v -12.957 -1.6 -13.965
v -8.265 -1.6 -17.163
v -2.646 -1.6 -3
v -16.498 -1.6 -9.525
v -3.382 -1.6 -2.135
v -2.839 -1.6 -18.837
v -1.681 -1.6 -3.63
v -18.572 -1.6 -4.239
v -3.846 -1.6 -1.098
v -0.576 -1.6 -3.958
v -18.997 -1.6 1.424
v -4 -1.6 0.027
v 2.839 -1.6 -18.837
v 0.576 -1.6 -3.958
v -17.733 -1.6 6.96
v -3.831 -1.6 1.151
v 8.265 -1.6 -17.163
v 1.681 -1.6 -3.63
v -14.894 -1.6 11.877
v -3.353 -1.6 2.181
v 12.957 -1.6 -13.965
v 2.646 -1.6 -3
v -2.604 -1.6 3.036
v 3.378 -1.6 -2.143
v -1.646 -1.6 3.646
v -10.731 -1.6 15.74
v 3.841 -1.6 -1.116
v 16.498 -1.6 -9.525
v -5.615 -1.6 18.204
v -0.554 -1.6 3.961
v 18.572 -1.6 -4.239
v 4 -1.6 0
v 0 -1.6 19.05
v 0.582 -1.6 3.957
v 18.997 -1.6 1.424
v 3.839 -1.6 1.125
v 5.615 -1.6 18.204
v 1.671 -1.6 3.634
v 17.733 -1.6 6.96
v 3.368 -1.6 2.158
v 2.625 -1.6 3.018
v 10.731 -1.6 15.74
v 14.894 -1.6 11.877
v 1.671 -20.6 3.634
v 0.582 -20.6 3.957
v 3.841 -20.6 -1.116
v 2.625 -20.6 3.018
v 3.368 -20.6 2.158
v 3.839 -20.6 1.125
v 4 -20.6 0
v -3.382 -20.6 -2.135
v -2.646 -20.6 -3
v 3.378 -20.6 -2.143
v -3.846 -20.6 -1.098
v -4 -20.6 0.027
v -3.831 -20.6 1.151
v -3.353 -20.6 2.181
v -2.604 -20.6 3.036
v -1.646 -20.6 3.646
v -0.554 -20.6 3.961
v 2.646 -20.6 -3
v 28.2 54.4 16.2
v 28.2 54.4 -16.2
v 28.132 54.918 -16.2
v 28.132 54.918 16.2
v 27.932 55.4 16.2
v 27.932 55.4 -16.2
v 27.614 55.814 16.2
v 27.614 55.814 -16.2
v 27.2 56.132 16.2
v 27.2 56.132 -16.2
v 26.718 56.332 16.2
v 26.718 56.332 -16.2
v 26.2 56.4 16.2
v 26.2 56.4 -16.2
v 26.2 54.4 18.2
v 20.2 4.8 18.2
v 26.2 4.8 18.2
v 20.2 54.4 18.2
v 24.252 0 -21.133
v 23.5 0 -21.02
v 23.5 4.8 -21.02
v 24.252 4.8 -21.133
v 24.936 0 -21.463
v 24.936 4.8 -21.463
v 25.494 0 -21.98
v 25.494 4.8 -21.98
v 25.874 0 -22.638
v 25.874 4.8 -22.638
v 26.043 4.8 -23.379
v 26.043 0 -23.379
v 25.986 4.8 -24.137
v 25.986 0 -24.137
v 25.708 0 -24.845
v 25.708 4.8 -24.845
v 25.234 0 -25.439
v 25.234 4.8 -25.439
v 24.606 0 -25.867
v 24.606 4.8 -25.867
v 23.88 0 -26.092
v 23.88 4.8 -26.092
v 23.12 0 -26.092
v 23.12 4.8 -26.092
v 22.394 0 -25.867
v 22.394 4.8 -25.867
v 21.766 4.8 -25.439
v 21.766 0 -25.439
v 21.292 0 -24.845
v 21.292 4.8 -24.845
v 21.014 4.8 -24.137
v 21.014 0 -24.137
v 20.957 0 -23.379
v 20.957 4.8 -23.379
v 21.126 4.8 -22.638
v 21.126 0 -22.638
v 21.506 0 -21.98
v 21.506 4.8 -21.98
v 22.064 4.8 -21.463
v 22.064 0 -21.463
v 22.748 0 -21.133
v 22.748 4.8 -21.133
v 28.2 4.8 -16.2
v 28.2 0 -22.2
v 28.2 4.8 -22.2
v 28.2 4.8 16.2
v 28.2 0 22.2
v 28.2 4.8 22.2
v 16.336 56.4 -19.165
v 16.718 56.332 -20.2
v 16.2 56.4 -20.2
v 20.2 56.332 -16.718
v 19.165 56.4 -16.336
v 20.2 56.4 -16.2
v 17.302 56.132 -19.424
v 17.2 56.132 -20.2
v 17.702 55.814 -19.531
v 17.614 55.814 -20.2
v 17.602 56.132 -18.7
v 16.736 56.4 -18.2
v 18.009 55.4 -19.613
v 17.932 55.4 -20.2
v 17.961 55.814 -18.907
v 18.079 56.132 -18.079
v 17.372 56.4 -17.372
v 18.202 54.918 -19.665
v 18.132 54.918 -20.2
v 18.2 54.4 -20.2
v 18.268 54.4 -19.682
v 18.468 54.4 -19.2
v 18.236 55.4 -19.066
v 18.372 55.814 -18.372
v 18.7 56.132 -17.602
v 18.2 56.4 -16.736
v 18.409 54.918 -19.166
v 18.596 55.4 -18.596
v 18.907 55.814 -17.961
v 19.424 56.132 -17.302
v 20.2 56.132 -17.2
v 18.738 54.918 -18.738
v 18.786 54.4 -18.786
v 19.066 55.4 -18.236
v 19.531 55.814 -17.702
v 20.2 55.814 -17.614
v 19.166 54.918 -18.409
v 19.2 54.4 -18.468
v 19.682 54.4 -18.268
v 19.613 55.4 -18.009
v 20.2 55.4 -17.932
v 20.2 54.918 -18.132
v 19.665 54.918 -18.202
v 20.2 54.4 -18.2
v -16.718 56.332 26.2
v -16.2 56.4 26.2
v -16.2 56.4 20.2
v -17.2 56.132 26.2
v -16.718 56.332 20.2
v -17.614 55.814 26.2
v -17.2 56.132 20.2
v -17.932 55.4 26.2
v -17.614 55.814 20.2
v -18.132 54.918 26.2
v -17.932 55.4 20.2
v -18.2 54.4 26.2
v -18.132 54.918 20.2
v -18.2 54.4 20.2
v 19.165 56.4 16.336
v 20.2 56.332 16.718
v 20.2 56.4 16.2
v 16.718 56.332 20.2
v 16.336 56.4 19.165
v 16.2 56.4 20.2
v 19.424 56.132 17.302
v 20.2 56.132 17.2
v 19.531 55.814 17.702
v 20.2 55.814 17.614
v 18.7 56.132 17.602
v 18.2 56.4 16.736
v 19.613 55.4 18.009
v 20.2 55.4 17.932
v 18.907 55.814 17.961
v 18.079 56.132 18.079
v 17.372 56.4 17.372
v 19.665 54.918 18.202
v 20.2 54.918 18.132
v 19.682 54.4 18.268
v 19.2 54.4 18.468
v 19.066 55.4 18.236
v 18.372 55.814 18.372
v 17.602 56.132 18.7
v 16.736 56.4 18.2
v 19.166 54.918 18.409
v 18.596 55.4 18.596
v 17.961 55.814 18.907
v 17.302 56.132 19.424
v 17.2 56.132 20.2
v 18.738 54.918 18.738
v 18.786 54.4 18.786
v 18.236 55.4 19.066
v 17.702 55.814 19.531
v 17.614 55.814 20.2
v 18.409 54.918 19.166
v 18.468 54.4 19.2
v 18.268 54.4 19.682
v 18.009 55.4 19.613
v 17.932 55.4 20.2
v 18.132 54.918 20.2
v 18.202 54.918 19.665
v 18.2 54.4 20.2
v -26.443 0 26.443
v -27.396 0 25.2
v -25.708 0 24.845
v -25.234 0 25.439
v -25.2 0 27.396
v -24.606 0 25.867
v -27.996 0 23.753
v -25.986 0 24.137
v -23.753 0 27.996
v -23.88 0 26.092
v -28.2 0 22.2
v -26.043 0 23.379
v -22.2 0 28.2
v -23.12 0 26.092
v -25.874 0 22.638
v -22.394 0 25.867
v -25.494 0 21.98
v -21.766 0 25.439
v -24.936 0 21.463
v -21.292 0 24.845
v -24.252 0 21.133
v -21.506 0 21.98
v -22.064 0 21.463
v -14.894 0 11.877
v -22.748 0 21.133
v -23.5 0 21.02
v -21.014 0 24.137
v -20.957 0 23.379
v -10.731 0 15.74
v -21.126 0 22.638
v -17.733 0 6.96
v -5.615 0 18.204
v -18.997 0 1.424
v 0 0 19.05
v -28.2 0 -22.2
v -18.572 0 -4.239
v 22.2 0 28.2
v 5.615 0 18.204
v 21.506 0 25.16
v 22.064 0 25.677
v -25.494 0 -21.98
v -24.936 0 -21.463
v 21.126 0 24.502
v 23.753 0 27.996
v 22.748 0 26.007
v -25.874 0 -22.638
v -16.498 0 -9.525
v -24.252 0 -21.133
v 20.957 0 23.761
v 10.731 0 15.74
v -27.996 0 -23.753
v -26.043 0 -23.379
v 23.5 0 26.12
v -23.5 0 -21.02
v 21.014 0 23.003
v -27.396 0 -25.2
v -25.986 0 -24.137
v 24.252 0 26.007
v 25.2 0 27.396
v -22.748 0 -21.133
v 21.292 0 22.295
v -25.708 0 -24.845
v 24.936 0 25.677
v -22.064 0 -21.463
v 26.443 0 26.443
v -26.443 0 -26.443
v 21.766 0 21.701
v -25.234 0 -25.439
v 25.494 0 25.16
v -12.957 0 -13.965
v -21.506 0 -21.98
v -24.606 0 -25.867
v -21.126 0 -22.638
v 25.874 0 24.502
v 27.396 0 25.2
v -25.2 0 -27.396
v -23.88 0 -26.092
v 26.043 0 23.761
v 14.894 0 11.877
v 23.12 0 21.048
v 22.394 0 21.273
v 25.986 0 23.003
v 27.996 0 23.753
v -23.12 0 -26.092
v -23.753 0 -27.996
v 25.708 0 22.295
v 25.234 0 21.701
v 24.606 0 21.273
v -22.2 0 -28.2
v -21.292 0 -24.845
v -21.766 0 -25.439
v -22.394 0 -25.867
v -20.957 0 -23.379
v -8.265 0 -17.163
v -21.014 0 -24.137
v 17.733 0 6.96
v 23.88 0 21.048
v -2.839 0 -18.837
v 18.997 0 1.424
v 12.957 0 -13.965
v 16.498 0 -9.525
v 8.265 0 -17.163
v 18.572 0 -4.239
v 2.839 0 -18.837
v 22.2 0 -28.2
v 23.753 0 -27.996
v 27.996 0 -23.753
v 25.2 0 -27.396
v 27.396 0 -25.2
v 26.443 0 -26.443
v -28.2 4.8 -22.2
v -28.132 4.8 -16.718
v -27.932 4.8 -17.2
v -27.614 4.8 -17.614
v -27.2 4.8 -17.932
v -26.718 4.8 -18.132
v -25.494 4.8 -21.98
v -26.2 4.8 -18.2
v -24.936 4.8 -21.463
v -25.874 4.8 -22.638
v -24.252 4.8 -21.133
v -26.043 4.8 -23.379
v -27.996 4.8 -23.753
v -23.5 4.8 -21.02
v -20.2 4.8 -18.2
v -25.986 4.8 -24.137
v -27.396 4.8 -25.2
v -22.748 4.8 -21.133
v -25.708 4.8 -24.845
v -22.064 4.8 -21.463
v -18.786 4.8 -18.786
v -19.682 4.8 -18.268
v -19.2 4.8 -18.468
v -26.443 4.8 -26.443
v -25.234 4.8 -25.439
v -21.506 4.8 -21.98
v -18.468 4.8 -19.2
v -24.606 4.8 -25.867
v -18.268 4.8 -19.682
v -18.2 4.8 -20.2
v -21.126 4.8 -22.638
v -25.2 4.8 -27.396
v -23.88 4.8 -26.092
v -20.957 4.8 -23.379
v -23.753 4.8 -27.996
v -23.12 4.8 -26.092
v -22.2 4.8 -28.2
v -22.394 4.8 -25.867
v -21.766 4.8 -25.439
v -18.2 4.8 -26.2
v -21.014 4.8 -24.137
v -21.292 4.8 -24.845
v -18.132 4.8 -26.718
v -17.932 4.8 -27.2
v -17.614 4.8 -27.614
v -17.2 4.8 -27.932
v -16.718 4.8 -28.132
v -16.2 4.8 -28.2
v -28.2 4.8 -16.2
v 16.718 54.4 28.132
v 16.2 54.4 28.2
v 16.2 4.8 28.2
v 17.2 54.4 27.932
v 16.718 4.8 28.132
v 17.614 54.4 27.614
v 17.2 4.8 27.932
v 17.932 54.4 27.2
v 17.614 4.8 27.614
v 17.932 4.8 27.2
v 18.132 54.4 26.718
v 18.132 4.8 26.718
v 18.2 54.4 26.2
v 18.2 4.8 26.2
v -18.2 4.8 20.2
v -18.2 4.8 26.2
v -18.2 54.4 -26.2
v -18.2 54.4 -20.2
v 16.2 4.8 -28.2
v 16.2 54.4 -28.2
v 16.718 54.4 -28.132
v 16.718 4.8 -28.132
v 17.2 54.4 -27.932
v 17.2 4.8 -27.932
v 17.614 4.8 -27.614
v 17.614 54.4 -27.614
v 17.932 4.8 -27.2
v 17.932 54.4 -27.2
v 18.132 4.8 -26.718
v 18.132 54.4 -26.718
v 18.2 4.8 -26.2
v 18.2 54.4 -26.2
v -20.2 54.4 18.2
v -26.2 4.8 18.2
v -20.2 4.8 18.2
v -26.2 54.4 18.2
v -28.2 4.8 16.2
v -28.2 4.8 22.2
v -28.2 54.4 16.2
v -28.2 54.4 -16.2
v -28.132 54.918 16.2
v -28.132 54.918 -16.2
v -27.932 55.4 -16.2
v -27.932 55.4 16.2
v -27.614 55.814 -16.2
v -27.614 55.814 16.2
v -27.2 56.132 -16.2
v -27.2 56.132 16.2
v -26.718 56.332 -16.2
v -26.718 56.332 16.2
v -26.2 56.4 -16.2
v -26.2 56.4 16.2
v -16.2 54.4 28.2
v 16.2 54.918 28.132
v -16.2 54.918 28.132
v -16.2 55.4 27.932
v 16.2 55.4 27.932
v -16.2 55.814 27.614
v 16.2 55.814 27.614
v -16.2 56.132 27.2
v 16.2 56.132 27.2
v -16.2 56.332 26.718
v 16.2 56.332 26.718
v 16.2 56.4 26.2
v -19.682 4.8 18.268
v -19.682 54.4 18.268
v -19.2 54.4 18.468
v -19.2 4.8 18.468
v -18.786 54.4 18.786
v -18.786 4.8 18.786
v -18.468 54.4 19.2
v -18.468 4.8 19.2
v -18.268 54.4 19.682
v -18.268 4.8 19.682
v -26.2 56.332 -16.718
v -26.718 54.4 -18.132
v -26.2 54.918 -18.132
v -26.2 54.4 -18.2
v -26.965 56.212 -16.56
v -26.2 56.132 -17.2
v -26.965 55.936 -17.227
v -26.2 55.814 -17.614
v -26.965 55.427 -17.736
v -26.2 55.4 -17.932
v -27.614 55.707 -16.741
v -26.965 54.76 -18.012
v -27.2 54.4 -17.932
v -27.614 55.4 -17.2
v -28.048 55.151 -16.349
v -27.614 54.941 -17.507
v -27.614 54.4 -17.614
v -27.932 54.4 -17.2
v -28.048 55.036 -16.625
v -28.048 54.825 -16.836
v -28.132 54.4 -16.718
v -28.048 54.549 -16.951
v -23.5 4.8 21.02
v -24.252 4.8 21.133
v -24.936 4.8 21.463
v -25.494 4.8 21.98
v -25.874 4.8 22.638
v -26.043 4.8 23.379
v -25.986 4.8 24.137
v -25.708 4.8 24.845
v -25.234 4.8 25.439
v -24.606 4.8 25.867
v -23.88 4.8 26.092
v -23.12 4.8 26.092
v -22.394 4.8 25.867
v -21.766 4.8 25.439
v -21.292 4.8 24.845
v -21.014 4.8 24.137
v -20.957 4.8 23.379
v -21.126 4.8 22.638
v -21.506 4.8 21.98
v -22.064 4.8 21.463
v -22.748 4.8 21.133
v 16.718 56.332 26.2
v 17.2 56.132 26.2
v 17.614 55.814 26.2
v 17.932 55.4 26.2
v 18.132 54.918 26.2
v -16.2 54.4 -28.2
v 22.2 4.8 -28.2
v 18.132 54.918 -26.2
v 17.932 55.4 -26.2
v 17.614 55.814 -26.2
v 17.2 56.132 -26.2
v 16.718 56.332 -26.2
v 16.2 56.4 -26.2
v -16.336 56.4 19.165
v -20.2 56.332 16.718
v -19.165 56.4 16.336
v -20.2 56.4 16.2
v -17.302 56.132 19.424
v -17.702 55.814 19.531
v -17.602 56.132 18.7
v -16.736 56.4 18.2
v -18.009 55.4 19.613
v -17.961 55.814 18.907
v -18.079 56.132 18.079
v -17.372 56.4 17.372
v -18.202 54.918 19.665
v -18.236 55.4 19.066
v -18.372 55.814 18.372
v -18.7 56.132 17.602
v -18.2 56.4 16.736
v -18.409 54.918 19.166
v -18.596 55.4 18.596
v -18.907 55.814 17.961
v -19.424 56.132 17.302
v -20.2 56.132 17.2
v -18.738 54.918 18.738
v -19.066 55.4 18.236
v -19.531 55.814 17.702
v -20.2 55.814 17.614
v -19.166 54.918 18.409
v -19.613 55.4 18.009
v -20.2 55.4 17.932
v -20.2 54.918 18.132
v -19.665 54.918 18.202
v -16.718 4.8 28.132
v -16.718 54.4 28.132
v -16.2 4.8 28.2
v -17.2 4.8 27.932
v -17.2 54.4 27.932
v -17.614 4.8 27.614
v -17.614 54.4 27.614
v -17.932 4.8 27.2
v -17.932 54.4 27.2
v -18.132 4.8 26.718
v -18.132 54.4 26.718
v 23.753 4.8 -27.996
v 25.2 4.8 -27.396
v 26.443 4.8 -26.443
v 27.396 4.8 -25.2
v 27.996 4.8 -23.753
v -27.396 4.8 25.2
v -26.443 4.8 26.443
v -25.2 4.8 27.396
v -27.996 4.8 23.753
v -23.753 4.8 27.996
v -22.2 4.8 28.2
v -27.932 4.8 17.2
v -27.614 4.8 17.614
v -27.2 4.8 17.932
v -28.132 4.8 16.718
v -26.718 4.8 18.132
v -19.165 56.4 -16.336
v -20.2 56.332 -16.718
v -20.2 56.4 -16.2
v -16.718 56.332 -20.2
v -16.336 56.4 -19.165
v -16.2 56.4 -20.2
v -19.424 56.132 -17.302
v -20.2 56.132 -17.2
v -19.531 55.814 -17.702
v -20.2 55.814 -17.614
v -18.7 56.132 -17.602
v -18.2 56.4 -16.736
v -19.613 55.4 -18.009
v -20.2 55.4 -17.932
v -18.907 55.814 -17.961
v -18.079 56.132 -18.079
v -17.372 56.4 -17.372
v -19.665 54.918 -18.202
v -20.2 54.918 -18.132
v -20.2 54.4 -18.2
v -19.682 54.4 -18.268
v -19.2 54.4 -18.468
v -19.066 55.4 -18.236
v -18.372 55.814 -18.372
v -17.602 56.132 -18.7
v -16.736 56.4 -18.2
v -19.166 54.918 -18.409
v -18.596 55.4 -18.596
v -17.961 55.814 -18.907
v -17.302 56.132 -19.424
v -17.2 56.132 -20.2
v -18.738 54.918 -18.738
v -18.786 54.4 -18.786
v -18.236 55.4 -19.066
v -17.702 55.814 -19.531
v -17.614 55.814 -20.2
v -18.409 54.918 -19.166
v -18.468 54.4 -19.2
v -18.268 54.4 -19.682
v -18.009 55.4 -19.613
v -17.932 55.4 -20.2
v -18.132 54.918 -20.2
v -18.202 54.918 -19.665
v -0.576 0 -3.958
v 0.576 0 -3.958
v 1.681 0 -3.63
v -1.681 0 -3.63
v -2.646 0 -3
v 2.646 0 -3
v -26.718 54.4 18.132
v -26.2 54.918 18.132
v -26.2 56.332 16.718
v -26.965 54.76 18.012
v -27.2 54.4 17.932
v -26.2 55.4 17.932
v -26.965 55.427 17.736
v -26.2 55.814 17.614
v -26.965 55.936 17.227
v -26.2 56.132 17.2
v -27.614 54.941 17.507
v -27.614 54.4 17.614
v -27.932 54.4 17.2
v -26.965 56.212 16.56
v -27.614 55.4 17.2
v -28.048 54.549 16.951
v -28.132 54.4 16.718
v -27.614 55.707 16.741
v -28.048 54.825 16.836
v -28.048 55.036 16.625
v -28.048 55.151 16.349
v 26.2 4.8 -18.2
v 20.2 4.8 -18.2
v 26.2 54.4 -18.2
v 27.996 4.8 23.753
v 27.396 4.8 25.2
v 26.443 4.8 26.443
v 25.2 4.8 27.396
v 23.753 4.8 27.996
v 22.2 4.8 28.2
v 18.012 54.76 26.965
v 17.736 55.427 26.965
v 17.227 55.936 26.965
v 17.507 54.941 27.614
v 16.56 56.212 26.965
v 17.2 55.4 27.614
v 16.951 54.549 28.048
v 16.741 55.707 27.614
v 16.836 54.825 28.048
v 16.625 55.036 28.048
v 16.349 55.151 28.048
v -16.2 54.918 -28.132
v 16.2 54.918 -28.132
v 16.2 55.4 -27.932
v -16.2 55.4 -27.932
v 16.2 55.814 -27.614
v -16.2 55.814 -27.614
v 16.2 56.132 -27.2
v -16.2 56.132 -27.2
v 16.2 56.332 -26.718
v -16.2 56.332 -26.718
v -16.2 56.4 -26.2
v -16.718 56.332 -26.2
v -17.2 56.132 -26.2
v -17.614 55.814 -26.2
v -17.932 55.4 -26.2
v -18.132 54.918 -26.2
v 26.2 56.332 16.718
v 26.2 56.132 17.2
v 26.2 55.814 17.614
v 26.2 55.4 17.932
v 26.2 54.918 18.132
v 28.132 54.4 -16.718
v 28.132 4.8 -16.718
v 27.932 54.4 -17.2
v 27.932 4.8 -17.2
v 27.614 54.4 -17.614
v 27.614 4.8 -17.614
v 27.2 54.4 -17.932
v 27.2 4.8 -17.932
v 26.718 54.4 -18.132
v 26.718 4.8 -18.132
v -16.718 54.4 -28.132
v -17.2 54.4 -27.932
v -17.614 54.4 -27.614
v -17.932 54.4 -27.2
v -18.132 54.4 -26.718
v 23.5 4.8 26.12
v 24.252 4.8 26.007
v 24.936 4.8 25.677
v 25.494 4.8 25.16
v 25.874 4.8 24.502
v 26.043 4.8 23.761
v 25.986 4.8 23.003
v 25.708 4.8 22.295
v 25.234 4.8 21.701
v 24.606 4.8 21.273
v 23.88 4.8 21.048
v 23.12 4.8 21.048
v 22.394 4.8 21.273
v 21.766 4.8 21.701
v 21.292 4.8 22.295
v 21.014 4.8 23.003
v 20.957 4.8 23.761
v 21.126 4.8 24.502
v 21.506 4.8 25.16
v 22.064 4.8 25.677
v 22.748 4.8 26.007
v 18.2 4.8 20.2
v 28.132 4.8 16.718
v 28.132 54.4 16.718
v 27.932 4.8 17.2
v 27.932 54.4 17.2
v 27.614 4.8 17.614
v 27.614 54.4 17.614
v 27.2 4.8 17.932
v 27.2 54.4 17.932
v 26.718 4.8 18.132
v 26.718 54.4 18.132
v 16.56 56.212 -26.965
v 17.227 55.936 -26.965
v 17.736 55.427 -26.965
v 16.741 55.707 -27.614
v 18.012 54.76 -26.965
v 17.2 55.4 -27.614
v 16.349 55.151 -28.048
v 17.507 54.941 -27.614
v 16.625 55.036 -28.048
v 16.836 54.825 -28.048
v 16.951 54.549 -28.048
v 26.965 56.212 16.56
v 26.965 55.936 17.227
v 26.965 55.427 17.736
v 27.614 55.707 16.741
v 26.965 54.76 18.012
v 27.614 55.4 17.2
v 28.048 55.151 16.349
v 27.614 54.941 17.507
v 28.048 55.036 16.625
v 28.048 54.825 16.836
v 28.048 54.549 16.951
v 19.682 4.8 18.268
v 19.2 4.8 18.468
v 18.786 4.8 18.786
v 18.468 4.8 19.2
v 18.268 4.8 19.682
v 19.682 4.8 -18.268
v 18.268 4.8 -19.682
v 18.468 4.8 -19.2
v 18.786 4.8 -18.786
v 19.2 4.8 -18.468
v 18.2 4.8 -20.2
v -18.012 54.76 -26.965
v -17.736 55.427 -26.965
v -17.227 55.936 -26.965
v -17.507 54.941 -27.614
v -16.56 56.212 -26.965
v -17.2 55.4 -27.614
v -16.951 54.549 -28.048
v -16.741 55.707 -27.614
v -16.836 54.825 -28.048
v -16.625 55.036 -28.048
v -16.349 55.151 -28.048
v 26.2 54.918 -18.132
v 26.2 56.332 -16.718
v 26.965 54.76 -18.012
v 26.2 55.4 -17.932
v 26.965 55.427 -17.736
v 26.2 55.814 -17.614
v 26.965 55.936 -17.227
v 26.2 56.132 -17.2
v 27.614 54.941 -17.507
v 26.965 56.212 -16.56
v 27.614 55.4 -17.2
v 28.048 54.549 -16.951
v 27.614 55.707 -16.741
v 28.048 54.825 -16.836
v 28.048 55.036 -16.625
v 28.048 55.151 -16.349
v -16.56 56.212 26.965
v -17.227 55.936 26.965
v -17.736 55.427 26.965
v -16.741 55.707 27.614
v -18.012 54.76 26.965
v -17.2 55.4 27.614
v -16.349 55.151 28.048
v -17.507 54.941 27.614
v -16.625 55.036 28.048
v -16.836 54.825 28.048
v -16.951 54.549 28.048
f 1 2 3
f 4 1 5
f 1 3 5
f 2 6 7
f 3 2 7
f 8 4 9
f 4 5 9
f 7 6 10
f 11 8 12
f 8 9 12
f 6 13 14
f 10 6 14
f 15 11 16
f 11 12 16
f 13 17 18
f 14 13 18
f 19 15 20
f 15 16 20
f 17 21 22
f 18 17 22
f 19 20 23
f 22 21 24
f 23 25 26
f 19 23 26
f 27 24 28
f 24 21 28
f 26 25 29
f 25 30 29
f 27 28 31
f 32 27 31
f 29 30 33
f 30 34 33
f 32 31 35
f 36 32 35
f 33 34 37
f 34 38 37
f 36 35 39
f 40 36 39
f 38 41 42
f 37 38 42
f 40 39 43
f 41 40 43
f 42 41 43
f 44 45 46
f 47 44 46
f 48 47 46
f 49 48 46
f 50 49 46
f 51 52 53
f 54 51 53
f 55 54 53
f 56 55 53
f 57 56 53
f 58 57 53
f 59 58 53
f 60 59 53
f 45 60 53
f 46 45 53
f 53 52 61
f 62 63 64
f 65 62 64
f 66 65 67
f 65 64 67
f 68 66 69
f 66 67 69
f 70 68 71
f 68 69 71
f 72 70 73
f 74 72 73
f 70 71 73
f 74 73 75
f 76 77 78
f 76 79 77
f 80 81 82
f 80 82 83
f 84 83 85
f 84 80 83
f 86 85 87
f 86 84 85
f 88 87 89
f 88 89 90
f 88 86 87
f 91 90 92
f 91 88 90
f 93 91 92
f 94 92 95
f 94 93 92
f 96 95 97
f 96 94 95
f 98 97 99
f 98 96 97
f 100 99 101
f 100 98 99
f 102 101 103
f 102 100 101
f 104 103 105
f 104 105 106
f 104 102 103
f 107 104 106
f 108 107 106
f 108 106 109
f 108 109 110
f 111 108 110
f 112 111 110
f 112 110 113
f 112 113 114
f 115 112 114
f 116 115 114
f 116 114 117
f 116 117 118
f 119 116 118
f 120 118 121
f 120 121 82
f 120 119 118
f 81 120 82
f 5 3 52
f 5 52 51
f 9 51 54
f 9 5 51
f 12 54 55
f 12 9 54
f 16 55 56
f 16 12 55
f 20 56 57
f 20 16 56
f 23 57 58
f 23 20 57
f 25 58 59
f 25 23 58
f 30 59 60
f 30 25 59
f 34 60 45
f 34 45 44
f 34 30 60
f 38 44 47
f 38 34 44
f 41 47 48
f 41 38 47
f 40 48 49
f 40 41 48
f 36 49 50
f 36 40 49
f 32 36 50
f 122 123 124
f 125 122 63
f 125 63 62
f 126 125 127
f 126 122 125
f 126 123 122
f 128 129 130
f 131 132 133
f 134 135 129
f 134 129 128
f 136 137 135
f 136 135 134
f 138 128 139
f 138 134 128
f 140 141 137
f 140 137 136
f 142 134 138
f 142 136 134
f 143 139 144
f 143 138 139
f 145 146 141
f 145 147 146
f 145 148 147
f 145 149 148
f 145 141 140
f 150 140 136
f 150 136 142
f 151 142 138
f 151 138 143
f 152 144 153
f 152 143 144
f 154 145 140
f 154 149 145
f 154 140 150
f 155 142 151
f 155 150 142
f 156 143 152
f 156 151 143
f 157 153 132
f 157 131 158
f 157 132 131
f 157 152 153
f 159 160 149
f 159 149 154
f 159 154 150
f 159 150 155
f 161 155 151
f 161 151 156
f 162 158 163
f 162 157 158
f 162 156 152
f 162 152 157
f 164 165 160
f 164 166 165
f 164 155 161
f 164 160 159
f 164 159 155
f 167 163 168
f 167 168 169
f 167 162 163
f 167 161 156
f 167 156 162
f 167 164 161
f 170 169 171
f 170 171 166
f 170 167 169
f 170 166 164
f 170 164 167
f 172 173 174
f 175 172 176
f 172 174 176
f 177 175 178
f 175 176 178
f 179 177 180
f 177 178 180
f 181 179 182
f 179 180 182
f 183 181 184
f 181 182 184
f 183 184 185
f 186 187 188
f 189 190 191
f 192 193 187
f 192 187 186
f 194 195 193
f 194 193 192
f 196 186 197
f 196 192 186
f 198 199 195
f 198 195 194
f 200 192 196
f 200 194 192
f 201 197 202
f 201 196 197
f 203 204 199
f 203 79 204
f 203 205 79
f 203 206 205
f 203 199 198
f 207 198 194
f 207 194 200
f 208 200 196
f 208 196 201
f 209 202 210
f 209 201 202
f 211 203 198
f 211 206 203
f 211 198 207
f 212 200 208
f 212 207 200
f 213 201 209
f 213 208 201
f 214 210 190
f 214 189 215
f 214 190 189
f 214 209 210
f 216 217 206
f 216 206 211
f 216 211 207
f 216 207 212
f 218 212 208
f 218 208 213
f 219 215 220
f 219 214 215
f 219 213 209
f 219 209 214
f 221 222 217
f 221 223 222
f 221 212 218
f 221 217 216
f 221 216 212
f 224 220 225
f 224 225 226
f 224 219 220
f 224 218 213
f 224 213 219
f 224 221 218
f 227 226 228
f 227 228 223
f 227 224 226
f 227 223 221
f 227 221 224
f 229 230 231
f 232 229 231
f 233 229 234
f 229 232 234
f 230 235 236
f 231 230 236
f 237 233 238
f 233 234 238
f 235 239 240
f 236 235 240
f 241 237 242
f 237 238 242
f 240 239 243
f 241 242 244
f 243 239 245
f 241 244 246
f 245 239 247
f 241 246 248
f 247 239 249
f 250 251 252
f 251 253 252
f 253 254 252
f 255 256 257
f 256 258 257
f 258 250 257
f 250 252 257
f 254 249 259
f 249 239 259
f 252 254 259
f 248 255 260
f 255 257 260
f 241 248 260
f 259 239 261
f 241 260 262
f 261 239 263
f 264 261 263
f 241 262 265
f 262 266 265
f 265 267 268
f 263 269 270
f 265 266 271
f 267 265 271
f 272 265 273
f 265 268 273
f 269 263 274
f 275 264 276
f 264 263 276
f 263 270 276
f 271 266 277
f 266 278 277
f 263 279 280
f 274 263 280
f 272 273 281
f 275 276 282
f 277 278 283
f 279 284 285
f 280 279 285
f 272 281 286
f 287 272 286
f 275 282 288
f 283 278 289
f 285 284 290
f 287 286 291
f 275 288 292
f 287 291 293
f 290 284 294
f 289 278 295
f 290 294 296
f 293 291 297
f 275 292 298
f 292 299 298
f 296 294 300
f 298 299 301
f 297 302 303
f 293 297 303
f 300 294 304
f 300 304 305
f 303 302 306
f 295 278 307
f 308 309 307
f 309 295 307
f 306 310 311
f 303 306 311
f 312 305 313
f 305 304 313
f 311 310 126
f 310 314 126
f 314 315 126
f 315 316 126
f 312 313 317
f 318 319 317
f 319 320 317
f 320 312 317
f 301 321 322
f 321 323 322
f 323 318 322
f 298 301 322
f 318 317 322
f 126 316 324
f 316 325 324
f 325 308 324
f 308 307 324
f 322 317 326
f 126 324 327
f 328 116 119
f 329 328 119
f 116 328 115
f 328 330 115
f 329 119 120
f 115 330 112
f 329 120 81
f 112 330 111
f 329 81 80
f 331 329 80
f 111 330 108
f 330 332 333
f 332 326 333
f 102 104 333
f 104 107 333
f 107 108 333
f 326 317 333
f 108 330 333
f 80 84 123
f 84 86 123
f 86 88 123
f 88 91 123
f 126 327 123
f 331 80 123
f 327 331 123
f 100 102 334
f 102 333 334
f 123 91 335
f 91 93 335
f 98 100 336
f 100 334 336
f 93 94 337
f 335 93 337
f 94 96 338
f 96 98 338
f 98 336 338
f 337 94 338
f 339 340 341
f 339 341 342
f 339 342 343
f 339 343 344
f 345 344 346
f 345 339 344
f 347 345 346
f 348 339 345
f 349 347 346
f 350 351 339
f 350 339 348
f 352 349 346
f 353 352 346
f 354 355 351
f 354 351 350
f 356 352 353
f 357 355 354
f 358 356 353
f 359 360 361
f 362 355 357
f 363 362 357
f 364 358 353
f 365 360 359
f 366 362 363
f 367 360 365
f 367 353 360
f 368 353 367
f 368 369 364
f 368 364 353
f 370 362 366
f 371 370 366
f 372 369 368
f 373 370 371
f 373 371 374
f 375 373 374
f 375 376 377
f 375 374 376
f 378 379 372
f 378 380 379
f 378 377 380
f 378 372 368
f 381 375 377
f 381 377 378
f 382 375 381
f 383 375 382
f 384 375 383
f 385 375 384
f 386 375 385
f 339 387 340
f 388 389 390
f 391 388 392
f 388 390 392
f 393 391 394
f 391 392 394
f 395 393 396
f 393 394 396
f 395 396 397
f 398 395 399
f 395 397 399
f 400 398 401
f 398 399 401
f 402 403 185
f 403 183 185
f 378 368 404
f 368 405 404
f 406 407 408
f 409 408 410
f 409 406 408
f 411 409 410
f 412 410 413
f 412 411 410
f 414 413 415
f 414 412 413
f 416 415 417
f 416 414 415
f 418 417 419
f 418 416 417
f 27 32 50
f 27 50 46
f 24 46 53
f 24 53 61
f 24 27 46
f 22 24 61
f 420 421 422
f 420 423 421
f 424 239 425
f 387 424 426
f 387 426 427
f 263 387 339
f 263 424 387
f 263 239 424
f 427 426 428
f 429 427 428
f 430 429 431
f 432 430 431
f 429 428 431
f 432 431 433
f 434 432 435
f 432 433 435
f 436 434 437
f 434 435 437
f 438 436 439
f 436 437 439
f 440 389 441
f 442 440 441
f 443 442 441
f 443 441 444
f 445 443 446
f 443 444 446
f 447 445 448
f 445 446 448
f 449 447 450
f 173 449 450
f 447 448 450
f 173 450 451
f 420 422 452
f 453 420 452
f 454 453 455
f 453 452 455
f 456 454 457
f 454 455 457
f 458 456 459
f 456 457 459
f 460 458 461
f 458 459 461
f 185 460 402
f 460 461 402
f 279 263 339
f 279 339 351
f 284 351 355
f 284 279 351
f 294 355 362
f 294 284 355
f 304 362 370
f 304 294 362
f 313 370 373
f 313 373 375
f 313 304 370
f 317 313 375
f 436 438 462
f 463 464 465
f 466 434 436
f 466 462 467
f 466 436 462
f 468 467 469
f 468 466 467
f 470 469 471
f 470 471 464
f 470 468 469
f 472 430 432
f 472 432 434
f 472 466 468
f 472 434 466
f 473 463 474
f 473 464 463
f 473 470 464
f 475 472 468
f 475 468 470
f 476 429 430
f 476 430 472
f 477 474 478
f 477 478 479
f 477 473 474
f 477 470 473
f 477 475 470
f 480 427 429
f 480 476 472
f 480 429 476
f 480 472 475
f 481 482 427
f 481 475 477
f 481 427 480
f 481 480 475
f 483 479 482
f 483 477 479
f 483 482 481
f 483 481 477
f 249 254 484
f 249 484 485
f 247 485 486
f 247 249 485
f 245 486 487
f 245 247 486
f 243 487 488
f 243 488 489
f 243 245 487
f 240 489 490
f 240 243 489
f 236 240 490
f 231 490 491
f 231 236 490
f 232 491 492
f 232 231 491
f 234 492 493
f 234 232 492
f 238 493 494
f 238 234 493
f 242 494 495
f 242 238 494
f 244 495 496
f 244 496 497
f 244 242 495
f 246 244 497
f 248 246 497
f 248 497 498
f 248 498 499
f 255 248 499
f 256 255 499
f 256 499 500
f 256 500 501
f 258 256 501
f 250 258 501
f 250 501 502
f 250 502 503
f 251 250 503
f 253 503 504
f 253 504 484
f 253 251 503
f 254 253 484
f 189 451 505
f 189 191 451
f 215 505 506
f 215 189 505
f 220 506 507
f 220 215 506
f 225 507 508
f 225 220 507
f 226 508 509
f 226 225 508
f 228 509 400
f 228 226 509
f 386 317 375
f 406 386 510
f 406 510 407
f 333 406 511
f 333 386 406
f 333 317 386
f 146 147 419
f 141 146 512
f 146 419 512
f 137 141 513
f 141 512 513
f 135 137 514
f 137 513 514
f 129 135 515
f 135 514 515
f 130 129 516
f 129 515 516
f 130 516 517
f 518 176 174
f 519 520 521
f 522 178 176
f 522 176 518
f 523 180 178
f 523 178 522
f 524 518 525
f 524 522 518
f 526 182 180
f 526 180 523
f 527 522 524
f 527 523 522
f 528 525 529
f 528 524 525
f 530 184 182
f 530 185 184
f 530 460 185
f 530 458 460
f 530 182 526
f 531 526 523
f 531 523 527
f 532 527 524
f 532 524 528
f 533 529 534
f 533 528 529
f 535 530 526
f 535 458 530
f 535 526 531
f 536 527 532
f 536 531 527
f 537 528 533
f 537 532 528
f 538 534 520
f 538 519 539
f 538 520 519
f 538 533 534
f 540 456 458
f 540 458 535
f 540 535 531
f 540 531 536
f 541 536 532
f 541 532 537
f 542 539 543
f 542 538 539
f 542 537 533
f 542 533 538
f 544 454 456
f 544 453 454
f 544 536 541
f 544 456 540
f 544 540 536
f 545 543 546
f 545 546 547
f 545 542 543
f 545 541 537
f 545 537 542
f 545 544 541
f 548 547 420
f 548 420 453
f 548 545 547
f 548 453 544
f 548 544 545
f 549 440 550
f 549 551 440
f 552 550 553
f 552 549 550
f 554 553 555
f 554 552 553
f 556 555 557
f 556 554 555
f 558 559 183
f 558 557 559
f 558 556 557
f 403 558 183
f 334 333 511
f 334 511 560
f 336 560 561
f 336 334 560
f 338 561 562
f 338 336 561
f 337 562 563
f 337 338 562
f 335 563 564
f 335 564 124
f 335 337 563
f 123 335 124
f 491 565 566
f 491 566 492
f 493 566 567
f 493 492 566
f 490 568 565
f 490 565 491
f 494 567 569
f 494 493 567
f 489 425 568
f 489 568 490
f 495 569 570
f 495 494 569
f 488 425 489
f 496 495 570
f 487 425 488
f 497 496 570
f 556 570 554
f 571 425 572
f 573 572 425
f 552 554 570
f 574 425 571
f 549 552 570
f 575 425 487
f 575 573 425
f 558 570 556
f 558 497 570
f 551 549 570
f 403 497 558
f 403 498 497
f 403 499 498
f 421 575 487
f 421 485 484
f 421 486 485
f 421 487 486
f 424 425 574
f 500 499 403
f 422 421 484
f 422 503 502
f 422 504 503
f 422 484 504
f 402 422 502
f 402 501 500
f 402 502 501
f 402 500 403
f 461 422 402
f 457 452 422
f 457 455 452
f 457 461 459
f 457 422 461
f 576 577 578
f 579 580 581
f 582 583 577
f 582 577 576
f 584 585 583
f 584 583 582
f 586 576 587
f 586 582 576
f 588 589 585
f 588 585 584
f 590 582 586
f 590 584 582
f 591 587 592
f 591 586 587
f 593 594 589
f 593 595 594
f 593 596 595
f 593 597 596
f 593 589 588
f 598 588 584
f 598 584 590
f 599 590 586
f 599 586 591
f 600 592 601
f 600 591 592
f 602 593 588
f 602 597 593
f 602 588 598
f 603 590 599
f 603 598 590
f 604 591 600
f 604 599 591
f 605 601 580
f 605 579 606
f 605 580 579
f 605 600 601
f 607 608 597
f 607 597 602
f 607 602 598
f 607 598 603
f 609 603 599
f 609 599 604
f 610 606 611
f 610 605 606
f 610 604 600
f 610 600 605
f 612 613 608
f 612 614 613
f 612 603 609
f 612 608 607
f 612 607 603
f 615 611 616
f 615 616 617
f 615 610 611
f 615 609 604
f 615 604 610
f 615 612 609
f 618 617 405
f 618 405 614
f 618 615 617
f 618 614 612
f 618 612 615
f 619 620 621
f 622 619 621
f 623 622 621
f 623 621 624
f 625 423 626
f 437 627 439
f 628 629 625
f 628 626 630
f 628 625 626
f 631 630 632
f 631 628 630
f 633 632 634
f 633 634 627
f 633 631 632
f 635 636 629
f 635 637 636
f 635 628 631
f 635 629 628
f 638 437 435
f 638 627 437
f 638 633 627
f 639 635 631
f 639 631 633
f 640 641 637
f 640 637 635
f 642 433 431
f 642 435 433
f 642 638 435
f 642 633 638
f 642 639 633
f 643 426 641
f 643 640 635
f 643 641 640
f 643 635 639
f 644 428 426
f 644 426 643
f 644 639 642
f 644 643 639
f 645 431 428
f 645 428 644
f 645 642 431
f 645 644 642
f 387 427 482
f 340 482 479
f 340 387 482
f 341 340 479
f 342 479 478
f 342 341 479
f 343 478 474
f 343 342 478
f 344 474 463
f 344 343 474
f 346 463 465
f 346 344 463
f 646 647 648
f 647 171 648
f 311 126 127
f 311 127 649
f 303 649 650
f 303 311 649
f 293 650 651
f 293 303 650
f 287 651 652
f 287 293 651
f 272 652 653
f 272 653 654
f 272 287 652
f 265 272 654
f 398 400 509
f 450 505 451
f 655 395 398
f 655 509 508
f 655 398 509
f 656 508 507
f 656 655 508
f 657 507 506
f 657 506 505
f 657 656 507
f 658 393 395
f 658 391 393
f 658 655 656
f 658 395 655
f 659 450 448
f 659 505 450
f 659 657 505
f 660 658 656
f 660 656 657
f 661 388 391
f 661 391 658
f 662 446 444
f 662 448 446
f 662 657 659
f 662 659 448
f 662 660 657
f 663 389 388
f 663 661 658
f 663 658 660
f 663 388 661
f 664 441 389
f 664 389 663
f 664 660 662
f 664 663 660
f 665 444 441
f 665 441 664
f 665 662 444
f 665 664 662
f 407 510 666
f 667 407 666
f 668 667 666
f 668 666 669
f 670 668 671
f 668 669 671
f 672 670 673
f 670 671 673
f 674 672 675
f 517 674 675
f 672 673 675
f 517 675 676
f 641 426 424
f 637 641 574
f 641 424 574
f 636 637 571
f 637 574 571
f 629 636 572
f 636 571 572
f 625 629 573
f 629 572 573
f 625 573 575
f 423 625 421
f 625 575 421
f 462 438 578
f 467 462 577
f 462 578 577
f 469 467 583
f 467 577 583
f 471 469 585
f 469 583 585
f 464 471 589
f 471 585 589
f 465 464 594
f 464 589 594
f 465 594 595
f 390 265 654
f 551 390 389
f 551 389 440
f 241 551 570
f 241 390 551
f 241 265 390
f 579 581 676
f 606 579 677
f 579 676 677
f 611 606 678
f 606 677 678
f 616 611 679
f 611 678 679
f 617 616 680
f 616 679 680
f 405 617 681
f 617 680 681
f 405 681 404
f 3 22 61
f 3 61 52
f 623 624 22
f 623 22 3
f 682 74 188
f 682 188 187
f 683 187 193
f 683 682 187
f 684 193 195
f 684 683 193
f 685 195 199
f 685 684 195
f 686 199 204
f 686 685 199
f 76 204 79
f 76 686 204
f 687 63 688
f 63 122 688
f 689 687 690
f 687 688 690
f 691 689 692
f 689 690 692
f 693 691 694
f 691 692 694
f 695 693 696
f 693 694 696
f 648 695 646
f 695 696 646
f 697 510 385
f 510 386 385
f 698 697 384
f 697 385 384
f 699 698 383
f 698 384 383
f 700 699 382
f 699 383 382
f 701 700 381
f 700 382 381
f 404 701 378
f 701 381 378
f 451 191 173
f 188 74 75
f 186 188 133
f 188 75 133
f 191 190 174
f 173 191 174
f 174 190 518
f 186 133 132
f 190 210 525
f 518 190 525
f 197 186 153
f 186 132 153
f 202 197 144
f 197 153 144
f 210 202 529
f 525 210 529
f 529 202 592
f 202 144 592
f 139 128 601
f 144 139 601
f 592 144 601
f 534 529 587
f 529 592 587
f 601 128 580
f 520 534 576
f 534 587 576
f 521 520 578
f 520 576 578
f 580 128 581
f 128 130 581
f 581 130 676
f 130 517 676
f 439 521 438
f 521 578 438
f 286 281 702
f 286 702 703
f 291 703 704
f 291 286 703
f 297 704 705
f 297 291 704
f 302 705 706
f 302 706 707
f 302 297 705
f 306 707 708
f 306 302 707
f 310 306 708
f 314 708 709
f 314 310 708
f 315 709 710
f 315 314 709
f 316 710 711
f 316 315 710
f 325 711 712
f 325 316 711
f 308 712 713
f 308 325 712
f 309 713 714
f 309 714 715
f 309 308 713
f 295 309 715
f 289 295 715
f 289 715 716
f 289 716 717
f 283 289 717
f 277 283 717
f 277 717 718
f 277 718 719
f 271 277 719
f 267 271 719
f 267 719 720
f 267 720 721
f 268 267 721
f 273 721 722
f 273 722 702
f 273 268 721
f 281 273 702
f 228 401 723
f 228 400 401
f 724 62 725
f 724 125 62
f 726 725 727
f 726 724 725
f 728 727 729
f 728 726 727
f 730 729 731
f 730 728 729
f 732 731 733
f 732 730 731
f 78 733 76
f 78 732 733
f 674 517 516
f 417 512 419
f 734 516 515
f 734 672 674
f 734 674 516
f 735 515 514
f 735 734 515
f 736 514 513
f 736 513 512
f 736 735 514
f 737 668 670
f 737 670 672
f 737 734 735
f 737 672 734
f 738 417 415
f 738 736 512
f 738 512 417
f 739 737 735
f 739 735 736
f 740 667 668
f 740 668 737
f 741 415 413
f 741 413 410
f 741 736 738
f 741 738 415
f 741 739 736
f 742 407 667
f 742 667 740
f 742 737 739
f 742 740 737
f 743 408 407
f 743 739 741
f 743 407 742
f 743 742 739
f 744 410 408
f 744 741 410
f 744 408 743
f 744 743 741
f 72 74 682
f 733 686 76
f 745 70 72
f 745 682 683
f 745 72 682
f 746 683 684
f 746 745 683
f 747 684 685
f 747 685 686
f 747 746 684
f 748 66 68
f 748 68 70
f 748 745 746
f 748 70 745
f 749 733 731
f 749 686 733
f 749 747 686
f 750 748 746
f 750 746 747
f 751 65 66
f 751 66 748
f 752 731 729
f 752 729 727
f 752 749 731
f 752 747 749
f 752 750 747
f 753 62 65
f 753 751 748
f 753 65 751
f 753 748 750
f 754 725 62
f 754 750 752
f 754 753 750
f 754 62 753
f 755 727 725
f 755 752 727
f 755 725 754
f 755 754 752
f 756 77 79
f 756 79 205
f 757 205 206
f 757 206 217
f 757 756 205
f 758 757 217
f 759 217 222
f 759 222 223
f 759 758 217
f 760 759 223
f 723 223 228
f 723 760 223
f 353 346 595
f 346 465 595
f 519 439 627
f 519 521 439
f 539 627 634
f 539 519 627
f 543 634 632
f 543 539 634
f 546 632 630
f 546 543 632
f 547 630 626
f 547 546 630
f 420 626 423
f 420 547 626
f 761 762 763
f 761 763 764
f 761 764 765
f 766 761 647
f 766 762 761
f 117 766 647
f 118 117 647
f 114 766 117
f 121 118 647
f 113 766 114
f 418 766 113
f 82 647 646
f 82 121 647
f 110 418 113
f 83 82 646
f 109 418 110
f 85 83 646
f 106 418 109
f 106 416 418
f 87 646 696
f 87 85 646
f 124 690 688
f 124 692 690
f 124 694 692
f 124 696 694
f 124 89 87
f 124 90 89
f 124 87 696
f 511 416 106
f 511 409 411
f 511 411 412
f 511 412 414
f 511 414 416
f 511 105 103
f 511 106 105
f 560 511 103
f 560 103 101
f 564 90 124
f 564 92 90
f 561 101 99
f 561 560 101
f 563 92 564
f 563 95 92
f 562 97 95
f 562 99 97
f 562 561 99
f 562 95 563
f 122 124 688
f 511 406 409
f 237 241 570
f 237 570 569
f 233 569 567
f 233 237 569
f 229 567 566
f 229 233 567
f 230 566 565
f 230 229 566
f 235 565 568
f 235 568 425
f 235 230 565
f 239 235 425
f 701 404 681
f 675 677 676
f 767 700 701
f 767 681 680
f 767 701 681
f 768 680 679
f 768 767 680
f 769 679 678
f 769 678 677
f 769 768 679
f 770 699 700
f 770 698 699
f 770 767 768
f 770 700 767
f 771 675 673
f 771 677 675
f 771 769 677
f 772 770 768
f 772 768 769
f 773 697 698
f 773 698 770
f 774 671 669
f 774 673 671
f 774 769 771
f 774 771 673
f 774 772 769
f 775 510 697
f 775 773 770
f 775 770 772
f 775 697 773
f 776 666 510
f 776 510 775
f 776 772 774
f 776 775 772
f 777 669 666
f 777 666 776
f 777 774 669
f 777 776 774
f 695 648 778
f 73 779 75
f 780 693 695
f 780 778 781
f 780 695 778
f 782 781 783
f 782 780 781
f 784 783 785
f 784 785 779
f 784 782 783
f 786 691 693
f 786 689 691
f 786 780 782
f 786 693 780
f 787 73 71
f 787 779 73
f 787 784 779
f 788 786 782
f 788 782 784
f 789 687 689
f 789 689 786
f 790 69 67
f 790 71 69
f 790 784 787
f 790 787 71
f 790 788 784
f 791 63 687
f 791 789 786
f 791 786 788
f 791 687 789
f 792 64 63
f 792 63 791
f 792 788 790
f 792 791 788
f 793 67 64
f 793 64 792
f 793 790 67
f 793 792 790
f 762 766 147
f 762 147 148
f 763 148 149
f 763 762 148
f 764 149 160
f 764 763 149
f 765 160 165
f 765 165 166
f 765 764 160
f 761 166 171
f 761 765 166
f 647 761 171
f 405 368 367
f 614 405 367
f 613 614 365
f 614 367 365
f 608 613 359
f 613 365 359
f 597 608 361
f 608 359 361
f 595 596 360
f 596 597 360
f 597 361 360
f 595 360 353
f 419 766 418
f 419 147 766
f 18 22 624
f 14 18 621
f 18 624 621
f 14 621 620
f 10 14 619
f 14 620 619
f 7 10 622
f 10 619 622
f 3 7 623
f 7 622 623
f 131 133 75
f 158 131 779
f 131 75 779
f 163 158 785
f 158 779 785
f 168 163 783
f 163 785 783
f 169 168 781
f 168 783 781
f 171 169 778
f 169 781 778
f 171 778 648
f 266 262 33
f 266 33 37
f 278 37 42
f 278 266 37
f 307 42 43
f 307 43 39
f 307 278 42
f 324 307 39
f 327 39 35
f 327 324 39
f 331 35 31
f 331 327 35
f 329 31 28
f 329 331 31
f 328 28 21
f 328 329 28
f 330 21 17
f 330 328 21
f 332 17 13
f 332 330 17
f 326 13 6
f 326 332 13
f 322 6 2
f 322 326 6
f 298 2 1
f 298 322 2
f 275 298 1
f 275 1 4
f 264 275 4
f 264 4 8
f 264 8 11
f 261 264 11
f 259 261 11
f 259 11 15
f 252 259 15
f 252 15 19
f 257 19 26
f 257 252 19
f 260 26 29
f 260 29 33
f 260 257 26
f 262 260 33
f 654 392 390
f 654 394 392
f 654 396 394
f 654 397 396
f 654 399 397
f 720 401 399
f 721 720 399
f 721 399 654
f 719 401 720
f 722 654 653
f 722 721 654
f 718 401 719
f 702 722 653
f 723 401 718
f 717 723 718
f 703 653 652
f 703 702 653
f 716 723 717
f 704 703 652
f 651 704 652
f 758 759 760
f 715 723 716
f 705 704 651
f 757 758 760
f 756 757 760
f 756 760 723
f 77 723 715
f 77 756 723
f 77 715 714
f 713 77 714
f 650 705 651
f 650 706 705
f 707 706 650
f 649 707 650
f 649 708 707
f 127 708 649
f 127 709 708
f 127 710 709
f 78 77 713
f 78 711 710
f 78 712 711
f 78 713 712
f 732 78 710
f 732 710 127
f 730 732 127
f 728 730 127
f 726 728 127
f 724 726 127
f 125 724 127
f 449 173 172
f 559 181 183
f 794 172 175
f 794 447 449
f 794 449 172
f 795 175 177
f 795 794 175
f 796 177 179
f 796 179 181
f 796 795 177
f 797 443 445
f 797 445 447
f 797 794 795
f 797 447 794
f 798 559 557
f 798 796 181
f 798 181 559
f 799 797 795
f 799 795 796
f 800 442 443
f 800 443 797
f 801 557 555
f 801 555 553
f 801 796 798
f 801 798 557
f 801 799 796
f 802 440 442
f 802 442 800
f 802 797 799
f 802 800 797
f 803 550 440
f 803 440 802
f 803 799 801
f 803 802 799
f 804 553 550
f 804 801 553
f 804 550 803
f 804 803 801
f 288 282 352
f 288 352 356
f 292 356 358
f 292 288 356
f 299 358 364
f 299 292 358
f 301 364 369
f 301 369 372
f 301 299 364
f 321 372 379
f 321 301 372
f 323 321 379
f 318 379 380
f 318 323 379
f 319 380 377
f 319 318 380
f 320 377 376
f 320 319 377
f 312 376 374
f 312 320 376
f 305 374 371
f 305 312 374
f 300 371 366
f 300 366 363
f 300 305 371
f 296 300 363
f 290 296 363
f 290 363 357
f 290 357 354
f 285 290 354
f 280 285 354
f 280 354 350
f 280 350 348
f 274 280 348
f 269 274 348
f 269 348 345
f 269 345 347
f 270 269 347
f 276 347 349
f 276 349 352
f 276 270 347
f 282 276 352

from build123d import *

# Parameters (mm, degrees)
SKETCH_1_R          = 2.55
SKETCH_1_R_2        = 19.05
EXTRUDE_1_DEPTH     = 56.4
SKETCH_1_3_R        = 19.05
SKETCH_1_3_R_2      = 4
EXTRUDE_2_DEPTH     = 1.6
SKETCH_1_4_R        = 2.55
CUT_EXTRUDE_1_DEPTH = 4.8
EXTRUDE_3_DEPTH     = 20.6
SKETCH_4_W          = 10
SKETCH_4_H          = 10
CUT_EXTRUDE_3_DEPTH = 51.6
FILLET_3_R          = 2
FILLET_4_R          = 2


with BuildPart() as part:
    # 草图1 → 凸台-拉伸1 (new body)
    # profile 1 of 10: a face of its own
    with BuildSketch(Plane(origin=(0, 0, 0), x_dir=(1, 0, 0), z_dir=(0, 1, 0))):
        with BuildLine():
            Line((-22.2, 28.2), (22.2, 28.2))
            ThreePointArc((22.2, 28.2), (26.442640687, 26.442640687), (28.2, 22.2))
            Line((28.2, 22.2), (28.2, -22.2))
            ThreePointArc((28.2, -22.2), (26.442640687, -26.442640687), (22.2, -28.2))
            Line((22.2, -28.2), (-22.2, -28.2))
            ThreePointArc((-22.2, -28.2), (-26.442640687, -26.442640687), (-28.2, -22.2))
            Line((-28.2, -22.2), (-28.2, 22.2))
            ThreePointArc((-28.2, 22.2), (-26.442640687, 26.442640687), (-22.2, 28.2))
        make_face()
        with Locations((23.5, 23.57)):
            Circle(SKETCH_1_R, mode=Mode.SUBTRACT)
        with Locations((23.5, -23.57)):
            Circle(SKETCH_1_R, mode=Mode.SUBTRACT)
        Circle(SKETCH_1_R_2, mode=Mode.SUBTRACT)
        with Locations((-23.5, 23.57)):
            Circle(SKETCH_1_R, mode=Mode.SUBTRACT)
        with Locations((-23.5, -23.57)):
            Circle(SKETCH_1_R, mode=Mode.SUBTRACT)
    # profile 2 of 10: a face of its own
    with BuildSketch(Plane(origin=(0, 0, 0), x_dir=(1, 0, 0), z_dir=(0, 1, 0))):
        Circle(SKETCH_1_R_2)
    # profile 3 of 10: a face of its own
    with BuildSketch(Plane(origin=(0, 0, 0), x_dir=(1, 0, 0), z_dir=(0, 1, 0))):
        with Locations((-23.5, 23.57)):
            Circle(SKETCH_1_R)
    # profile 4 of 10: a face of its own
    with BuildSketch(Plane(origin=(0, 0, 0), x_dir=(1, 0, 0), z_dir=(0, 1, 0))):
        with Locations((23.5, 23.57)):
            Circle(SKETCH_1_R)
    # profile 5 of 10: a face of its own
    with BuildSketch(Plane(origin=(0, 0, 0), x_dir=(1, 0, 0), z_dir=(0, 1, 0))):
        with Locations((23.5, -23.57)):
            Circle(SKETCH_1_R)
    # profile 6 of 10: a face of its own
    with BuildSketch(Plane(origin=(0, 0, 0), x_dir=(1, 0, 0), z_dir=(0, 1, 0))):
        with Locations((-23.5, -23.57)):
            Circle(SKETCH_1_R)
    # profile 7 of 10: a face of its own
    with BuildSketch(Plane(origin=(0, 0, 0), x_dir=(1, 0, 0), z_dir=(0, 1, 0))):
        with BuildLine():
            ThreePointArc((2.645751311, 3), (0, 4), (-2.645751311, 3))
            Line((-2.645751311, 3), (2.645751311, 3))
        make_face()
    # profile 8 of 10: a face of its own
    with BuildSketch(Plane(origin=(0, 0, 0), x_dir=(1, 0, 0), z_dir=(0, 1, 0))):
        with BuildLine():
            Line((2.645751311, 3), (-2.645751311, 3))
            ThreePointArc((-2.645751311, 3), (-1.645751311, -3.645751311), (4, 0))
            ThreePointArc((4, 0), (3.645751311, 1.645751311), (2.645751311, 3))
        make_face()
    # profile 9 of 10: a face of its own
    with BuildSketch(Plane(origin=(0, 0, 0), x_dir=(1, 0, 0), z_dir=(0, 1, 0))):
        with BuildLine():
            ThreePointArc((2.645751311, 3), (0, 4), (-2.645751311, 3))
            Line((-2.645751311, 3), (2.645751311, 3))
        make_face()
    # profile 10 of 10: a face of its own
    with BuildSketch(Plane(origin=(0, 0, 0), x_dir=(1, 0, 0), z_dir=(0, 1, 0))):
        with BuildLine():
            Line((2.645751311, 3), (-2.645751311, 3))
            ThreePointArc((-2.645751311, 3), (-1.645751311, -3.645751311), (4, 0))
            ThreePointArc((4, 0), (3.645751311, 1.645751311), (2.645751311, 3))
        make_face()
    extrude(amount=EXTRUDE_1_DEPTH)

    # 草图1<3> → 凸台-拉伸2 (add)
    with BuildSketch(Plane(origin=(0, 0, 0), x_dir=(1, 0, 0), z_dir=(0, 1, 0))):
        with Locations(Location((0, 0, 0), (0, 0, 270))):
            Circle(SKETCH_1_3_R)
        with Locations(Location((0, 0, 0), (0, 0, 270))):
            Circle(SKETCH_1_3_R_2, mode=Mode.SUBTRACT)
    extrude(amount=-EXTRUDE_2_DEPTH)

    # 草图1<4> → 切除-拉伸1 (cut)
    with BuildSketch(Plane(origin=(0, 0, 0), x_dir=(1, 0, 0), z_dir=(0, 1, 0))):
        with Locations(Location((23.5, -23.57, 0), (0, 0, 270))):
            Circle(SKETCH_1_4_R)
        with Locations(Location((-23.5, 23.57, 0), (0, 0, 270))):
            Circle(SKETCH_1_4_R)
        with Locations(Location((23.5, 23.57, 0), (0, 0, 270))):
            Circle(SKETCH_1_4_R)
        with Locations(Location((-23.5, -23.57, 0), (0, 0, 90))):
            Circle(SKETCH_1_4_R)
    extrude(amount=CUT_EXTRUDE_1_DEPTH, mode=Mode.SUBTRACT)

    # 草图1<5> → 凸台-拉伸3 (add)
    with BuildSketch(Plane(origin=(0, 0, 0), x_dir=(1, 0, 0), z_dir=(0, 1, 0))):
        with BuildLine():
            Line((2.645751311, 3), (-2.645751311, 3))
            ThreePointArc((-2.645751311, 3), (-1.645751311, -3.645751311), (4, 0))
            ThreePointArc((4, 0), (3.645751311, 1.645751311), (2.645751311, 3))
        make_face()
    extrude(amount=-EXTRUDE_3_DEPTH)

    # 草图4 → 切除-拉伸3 (cut)
    with BuildSketch(Plane(origin=(0, 56.4, 0), x_dir=(1, 0, 0), z_dir=(0, 1, 0))):
        with Locations((-23.2, 23.2)):
            Rectangle(SKETCH_4_W, SKETCH_4_H)
        with Locations((-23.2, -23.2)):
            Rectangle(SKETCH_4_W, SKETCH_4_H)
        with Locations((23.2, -23.2)):
            Rectangle(SKETCH_4_W, SKETCH_4_H)
        with Locations((23.2, 23.2)):
            Rectangle(SKETCH_4_W, SKETCH_4_H)
    extrude(amount=-CUT_EXTRUDE_3_DEPTH, mode=Mode.SUBTRACT)

    # 圆角3
    fillet_3_edges = [part.edges().sort_by_distance(p)[0] for p in [
        (-23.2, 56.4, -18.2),
        (-18.2, 56.4, -23.2),
        (-28.2, 30.6, -18.2),
        (-18.2, 30.6, -28.2),
        (-18.2, 30.6, -18.2),
        (28.2, 30.6, -18.2),
        (18.2, 30.6, -18.2),
        (18.2, 30.6, -28.2),
        (18.2, 56.4, -23.2),
        (23.2, 56.4, -18.2),
        (23.2, 56.4, 18.2),
        (18.2, 56.4, 23.2),
        (28.2, 30.6, 18.2),
        (18.2, 30.6, 28.2),
        (18.2, 30.6, 18.2),
        (-18.2, 56.4, 23.2),
        (-23.2, 56.4, 18.2),
        (-18.2, 30.6, 28.2),
        (-28.2, 30.6, 18.2),
        (-18.2, 30.6, 18.2),
    ]]
    fillet(fillet_3_edges, radius=FILLET_3_R)

    # 圆角4
    # the kernel refuses this fillet: 2 mm, written as the material it takes off along each edge
    with BuildSketch(Plane(origin=(26.2, 54.4, 16.2), x_dir=(0, 1, 0), z_dir=(1, 0, 0))) as fillet_4_piece_1_section:
        Polygon((0, 0), (FILLET_4_R, 0), (FILLET_4_R, FILLET_4_R), (0, FILLET_4_R), align=None)
    fillet_4_piece_1 = extrude(amount=FILLET_4_R, mode=Mode.PRIVATE)
    fillet_4_piece_1 = fillet_4_piece_1 - Plane(origin=(26.2, 54.4, 16.2), x_dir=(0, -0.7071067811865475, -0.7071067811865475), z_dir=(1, 0, 0)) * Sphere(FILLET_4_R, mode=Mode.PRIVATE)
    add(fillet_4_piece_1, mode=Mode.SUBTRACT)
    with BuildSketch(Plane(origin=(16.2, 54.4, 26.2), x_dir=(0, 1, 0), z_dir=(0, 0, 1))) as fillet_4_piece_2_section:
        Polygon((0, 0), (FILLET_4_R, 0), (FILLET_4_R, -FILLET_4_R), (0, -FILLET_4_R), align=None)
    fillet_4_piece_2 = extrude(amount=FILLET_4_R, mode=Mode.PRIVATE)
    fillet_4_piece_2 = fillet_4_piece_2 - Plane(origin=(16.2, 54.4, 26.2), x_dir=(-0.7071067811865475, -0.7071067811865475, 1.0048591735576168e-15), z_dir=(0, 0, 1)) * Sphere(FILLET_4_R, mode=Mode.PRIVATE)
    add(fillet_4_piece_2, mode=Mode.SUBTRACT)
    with BuildSketch(Plane(origin=(-26.2, 54.4, 16.2), x_dir=(0, 1, 0), z_dir=(-1, 0, 0))) as fillet_4_piece_3_section:
        Polygon((0, 0), (FILLET_4_R, 0), (FILLET_4_R, -FILLET_4_R), (0, -FILLET_4_R), align=None)
    fillet_4_piece_3 = extrude(amount=FILLET_4_R, mode=Mode.PRIVATE)
    fillet_4_piece_3 = fillet_4_piece_3 - Plane(origin=(-26.2, 54.4, 16.2), x_dir=(0, -0.7071067811865475, -0.7071067811865475), z_dir=(-1, 0, 0)) * Sphere(FILLET_4_R, mode=Mode.PRIVATE)
    add(fillet_4_piece_3, mode=Mode.SUBTRACT)
    with BuildSketch(Plane(origin=(-16.2, 54.4, 26.2), x_dir=(0, 1, 0), z_dir=(0, 0, 1))) as fillet_4_piece_4_section:
        Polygon((0, 0), (FILLET_4_R, 0), (FILLET_4_R, FILLET_4_R), (0, FILLET_4_R), align=None)
    fillet_4_piece_4 = extrude(amount=FILLET_4_R, mode=Mode.PRIVATE)
    fillet_4_piece_4 = fillet_4_piece_4 - Plane(origin=(-16.2, 54.4, 26.2), x_dir=(0.7071067811865475, -0.7071067811865475, 0), z_dir=(0, 0, 1)) * Sphere(FILLET_4_R, mode=Mode.PRIVATE)
    add(fillet_4_piece_4, mode=Mode.SUBTRACT)
    with BuildSketch(Plane(origin=(-16.2, 54.4, -26.2), x_dir=(0, 1, 0), z_dir=(0, 0, -1))) as fillet_4_piece_5_section:
        Polygon((0, 0), (FILLET_4_R, 0), (FILLET_4_R, -FILLET_4_R), (0, -FILLET_4_R), align=None)
    fillet_4_piece_5 = extrude(amount=FILLET_4_R, mode=Mode.PRIVATE)
    fillet_4_piece_5 = fillet_4_piece_5 - Plane(origin=(-16.2, 54.4, -26.2), x_dir=(0.7071067811865475, -0.7071067811865475, 0), z_dir=(0, 0, -1)) * Sphere(FILLET_4_R, mode=Mode.PRIVATE)
    add(fillet_4_piece_5, mode=Mode.SUBTRACT)
    with BuildSketch(Plane(origin=(-26.2, 54.4, -16.2), x_dir=(0, 1, 0), z_dir=(-1, 0, 0))) as fillet_4_piece_6_section:
        Polygon((0, 0), (FILLET_4_R, 0), (FILLET_4_R, FILLET_4_R), (0, FILLET_4_R), align=None)
    fillet_4_piece_6 = extrude(amount=FILLET_4_R, mode=Mode.PRIVATE)
    fillet_4_piece_6 = fillet_4_piece_6 - Plane(origin=(-26.2, 54.4, -16.2), x_dir=(0, -0.7071067811865475, 0.7071067811865475), z_dir=(-1, 0, 0)) * Sphere(FILLET_4_R, mode=Mode.PRIVATE)
    add(fillet_4_piece_6, mode=Mode.SUBTRACT)
    with BuildSketch(Plane(origin=(26.2, 54.4, -16.2), x_dir=(0, 1, 0), z_dir=(1, 0, 0))) as fillet_4_piece_7_section:
        Polygon((0, 0), (FILLET_4_R, 0), (FILLET_4_R, -FILLET_4_R), (0, -FILLET_4_R), align=None)
    fillet_4_piece_7 = extrude(amount=FILLET_4_R, mode=Mode.PRIVATE)
    fillet_4_piece_7 = fillet_4_piece_7 - Plane(origin=(26.2, 54.4, -16.2), x_dir=(0, -0.7071067811865475, 0.7071067811865475), z_dir=(1, 0, 0)) * Sphere(FILLET_4_R, mode=Mode.PRIVATE)
    add(fillet_4_piece_7, mode=Mode.SUBTRACT)
    with BuildSketch(Plane(origin=(16.2, 54.4, -26.2), x_dir=(0, 1, 0), z_dir=(0, 0, -1))) as fillet_4_piece_8_section:
        Polygon((0, 0), (FILLET_4_R, 0), (FILLET_4_R, FILLET_4_R), (0, FILLET_4_R), align=None)
    fillet_4_piece_8 = extrude(amount=FILLET_4_R, mode=Mode.PRIVATE)
    fillet_4_piece_8 = fillet_4_piece_8 - Plane(origin=(16.2, 54.4, -26.2), x_dir=(-0.7071067811865475, -0.7071067811865475, -1.0048591735576168e-15), z_dir=(0, 0, -1)) * Sphere(FILLET_4_R, mode=Mode.PRIVATE)
    add(fillet_4_piece_8, mode=Mode.SUBTRACT)
    with BuildSketch(Plane(origin=(-16.2, 56.4, -28.2), x_dir=(0, -1, 0), z_dir=(1, 0, 0)), Plane(origin=(-28.2, 56.4, 16.2), x_dir=(0, -1, 0), z_dir=(0, 0, -1)), Plane(origin=(16.2, 56.4, 28.2), x_dir=(0, -1, 0), z_dir=(-1, 0, 0)), Plane(origin=(28.2, 56.4, -16.2), x_dir=(0, -1, 0), z_dir=(0, 0, 1))) as fillet_4_piece_9:
        with BuildLine():
            CenterArc((FILLET_4_R, -FILLET_4_R), FILLET_4_R, 90, 90)
            Line((0, -FILLET_4_R), (0, 0))
            Line((0, 0), (FILLET_4_R, 0))
        make_face()
    extrude(amount=32.4, mode=Mode.SUBTRACT)


solid = part.part
